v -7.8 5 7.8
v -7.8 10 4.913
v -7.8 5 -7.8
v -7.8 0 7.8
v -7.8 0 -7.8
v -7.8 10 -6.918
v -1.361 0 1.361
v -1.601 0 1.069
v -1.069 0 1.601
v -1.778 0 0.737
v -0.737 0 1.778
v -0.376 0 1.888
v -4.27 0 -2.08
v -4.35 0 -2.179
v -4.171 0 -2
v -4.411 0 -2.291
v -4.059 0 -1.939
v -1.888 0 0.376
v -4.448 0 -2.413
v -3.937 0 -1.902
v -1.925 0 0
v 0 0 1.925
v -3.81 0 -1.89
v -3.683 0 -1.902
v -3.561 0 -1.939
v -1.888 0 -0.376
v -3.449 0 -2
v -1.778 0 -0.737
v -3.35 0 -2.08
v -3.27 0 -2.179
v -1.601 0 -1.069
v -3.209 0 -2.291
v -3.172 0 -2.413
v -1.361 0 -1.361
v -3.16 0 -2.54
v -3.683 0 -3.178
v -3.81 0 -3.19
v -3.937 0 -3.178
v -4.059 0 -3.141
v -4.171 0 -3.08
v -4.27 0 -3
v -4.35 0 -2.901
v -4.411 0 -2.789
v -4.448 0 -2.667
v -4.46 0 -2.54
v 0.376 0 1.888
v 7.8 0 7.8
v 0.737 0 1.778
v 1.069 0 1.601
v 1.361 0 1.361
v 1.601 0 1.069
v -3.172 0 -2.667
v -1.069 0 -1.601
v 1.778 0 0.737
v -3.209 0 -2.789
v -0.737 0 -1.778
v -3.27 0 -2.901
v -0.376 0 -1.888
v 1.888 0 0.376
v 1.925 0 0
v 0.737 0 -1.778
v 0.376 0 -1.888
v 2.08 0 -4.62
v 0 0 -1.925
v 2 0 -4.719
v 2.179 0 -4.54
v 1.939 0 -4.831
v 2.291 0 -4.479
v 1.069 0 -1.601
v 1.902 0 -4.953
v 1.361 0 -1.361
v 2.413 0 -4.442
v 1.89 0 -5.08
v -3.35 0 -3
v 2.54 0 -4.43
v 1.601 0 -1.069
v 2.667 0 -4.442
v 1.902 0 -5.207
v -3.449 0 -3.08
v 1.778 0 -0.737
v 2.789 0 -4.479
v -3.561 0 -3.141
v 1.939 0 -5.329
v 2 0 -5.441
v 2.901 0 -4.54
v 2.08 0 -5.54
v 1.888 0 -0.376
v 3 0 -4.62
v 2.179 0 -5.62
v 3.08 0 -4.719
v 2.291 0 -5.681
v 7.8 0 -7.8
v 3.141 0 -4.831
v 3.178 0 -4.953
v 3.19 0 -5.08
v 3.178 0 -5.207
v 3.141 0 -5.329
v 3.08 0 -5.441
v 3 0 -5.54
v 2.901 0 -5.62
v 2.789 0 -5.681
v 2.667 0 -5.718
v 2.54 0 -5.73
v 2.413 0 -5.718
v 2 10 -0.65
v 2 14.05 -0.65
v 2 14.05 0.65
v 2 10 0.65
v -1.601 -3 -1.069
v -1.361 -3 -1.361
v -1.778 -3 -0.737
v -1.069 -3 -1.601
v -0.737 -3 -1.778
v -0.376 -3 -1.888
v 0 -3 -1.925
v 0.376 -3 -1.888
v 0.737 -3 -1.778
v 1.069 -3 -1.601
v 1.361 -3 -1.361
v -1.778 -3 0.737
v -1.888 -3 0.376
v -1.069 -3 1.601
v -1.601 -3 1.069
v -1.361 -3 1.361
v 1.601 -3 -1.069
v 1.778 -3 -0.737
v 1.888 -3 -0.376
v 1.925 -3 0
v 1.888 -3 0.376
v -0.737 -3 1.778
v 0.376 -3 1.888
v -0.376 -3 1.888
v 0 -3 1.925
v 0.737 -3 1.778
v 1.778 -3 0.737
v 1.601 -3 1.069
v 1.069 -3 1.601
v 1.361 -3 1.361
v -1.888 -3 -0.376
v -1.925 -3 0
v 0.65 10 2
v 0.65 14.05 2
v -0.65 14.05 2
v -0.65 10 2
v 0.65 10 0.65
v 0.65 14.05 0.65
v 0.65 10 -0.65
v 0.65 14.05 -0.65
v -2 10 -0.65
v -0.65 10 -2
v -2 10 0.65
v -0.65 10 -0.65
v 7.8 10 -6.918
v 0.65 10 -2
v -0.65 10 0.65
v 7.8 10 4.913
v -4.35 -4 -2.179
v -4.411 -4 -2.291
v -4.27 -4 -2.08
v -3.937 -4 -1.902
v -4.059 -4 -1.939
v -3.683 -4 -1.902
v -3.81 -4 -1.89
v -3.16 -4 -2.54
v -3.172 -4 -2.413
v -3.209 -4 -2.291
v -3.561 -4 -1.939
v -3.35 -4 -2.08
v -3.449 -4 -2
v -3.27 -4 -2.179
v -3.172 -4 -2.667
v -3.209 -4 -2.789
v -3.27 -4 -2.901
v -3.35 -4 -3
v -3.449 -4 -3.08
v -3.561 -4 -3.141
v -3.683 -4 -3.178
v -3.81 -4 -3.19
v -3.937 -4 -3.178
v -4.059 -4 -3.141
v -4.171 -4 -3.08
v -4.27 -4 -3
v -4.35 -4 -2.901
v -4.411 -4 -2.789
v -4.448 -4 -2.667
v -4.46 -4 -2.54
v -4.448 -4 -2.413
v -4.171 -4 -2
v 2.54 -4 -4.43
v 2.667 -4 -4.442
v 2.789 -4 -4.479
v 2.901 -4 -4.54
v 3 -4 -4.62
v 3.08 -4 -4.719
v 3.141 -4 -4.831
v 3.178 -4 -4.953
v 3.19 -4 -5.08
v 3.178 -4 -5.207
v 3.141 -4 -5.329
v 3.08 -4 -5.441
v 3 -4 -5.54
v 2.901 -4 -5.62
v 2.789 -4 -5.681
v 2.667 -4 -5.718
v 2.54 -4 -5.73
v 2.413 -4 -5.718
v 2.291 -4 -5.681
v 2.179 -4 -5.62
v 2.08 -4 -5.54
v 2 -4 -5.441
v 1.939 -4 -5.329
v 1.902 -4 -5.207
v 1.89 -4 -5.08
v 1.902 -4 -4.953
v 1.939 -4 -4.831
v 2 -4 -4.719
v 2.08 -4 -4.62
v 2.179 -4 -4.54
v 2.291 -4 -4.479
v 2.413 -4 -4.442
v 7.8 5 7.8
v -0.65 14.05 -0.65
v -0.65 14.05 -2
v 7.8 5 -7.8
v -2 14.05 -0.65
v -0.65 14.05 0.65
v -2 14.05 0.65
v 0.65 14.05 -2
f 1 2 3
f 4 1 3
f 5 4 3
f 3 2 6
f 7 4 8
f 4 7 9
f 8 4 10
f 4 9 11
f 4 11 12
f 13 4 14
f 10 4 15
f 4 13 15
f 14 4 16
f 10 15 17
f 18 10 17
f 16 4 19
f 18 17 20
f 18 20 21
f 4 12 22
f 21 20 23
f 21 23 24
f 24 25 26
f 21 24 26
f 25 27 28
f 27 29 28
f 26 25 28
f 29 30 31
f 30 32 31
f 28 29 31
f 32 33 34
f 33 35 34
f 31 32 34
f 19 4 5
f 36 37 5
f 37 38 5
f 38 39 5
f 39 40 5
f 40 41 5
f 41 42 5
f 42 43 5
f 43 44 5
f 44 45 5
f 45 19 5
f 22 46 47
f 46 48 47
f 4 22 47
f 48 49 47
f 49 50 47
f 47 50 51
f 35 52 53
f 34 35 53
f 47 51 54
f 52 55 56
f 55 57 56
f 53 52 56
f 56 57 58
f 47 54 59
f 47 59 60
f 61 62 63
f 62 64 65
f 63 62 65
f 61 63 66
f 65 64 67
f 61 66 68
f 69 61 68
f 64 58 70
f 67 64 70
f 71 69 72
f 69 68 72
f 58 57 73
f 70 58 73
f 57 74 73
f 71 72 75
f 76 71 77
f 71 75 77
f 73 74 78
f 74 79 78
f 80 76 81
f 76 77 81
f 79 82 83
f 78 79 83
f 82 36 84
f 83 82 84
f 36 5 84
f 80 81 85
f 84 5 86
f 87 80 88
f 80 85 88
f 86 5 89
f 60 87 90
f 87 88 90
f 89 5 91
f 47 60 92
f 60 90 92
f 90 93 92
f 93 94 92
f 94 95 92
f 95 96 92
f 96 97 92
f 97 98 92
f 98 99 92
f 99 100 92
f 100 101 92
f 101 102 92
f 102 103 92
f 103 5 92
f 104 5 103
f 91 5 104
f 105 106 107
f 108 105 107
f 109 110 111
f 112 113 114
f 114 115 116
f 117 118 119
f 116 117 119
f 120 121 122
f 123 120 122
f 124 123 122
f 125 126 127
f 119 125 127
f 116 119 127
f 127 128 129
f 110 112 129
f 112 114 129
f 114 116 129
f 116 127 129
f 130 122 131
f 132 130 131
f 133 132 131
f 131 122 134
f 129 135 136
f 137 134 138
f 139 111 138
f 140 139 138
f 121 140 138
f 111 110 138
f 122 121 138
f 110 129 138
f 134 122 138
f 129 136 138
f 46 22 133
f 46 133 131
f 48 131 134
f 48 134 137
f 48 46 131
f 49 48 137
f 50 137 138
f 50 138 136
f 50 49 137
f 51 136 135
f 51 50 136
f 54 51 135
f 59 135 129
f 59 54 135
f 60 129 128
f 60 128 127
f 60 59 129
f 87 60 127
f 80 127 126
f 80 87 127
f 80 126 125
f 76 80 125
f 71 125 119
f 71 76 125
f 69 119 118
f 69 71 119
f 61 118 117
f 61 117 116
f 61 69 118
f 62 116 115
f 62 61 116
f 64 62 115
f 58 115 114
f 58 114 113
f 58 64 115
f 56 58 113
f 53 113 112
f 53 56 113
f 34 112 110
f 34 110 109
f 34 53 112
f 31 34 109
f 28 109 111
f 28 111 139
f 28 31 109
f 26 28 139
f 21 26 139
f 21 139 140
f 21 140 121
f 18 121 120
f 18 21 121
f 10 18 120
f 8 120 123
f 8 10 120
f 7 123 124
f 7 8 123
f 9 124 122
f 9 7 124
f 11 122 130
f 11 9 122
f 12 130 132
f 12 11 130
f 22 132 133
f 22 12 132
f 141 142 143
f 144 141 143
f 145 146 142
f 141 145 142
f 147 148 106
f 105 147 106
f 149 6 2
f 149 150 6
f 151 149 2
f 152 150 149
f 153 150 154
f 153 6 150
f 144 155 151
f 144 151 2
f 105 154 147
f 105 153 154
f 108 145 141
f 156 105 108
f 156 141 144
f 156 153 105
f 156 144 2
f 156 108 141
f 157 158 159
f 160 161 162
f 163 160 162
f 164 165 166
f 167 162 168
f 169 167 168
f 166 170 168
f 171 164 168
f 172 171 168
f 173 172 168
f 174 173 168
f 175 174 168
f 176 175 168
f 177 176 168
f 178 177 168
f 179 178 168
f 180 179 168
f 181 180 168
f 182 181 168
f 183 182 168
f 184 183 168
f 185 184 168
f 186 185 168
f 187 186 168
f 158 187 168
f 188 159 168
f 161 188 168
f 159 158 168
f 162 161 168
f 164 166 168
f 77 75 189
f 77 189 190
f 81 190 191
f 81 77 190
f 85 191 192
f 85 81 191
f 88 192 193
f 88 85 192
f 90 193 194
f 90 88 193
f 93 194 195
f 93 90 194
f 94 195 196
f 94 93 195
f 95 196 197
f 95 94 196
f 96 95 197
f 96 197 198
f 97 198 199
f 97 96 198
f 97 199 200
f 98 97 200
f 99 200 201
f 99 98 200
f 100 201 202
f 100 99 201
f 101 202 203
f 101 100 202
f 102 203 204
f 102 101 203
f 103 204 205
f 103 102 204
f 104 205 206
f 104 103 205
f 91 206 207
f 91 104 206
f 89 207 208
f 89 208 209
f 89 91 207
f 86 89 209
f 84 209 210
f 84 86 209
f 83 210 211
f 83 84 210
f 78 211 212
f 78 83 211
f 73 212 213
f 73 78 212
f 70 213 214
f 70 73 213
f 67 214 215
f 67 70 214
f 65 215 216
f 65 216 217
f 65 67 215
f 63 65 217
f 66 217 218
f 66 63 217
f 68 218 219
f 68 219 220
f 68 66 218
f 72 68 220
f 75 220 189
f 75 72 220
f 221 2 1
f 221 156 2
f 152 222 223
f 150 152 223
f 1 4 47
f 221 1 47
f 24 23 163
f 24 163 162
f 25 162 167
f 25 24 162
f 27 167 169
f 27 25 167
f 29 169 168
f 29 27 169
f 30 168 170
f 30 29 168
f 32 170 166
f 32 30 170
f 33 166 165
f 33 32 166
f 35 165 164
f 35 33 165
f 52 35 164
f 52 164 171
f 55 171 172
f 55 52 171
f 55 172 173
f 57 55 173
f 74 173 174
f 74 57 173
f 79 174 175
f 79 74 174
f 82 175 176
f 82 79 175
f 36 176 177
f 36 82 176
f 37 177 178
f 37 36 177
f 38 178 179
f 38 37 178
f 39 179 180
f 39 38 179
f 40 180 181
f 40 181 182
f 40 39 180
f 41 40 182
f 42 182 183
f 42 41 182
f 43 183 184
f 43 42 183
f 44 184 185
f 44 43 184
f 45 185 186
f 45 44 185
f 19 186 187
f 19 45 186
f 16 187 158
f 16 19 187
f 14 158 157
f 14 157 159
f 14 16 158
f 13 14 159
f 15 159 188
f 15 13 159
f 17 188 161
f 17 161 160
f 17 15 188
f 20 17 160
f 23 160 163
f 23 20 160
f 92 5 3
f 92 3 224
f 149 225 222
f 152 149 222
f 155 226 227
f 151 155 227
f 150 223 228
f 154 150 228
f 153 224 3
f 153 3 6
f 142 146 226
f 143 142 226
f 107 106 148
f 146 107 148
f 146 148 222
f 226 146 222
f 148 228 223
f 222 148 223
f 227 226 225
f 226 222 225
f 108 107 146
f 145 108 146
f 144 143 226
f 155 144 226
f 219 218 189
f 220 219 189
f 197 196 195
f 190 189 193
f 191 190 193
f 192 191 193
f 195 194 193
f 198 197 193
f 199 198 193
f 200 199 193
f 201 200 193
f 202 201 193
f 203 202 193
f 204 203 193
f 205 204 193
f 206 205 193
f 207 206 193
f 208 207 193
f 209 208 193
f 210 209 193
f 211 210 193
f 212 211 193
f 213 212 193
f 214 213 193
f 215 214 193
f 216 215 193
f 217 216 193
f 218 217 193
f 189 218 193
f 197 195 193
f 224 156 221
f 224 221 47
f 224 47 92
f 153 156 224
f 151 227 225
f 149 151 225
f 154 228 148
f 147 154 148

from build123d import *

# Parameters (mm, degrees)
SKETCH1_W           = 15.6
SKETCH1_H           = 15.6
BOSS_EXTRUDE1_DEPTH = 5
BOSS_EXTRUDE2_DEPTH = 7.8
BOSS_EXTRUDE3_DEPTH = 4.05
SKETCH4_R           = 1.925
BOSS_EXTRUDE4_DEPTH = 3
SKETCH6_R           = 0.65
BOSS_EXTRUDE5_DEPTH = 4


with BuildPart() as part:
    # Sketch1 → Boss-Extrude1 (new body)
    with BuildSketch(Plane(origin=(0, 0, 0), x_dir=(1, 0, 0), z_dir=(0, 1, 0))):
        Rectangle(SKETCH1_W, SKETCH1_H)
    extrude(amount=BOSS_EXTRUDE1_DEPTH)

    # Sketch2 → Boss-Extrude2 (add, symmetric)
    with BuildSketch(Plane(origin=(0, 0, 0), x_dir=(0, 0, -1), z_dir=(1, 0, 0))):
        Polygon((-7.8, 5), (7.8, 5), (6.918365096, 10), (-4.913248654, 10), align=None)
    extrude(amount=BOSS_EXTRUDE2_DEPTH, both=True)

    # Sketch3 → Boss-Extrude3 (add)
    with BuildSketch(Plane(origin=(0, 10, 0), x_dir=(1, 0, 0), z_dir=(0, 1, 0))):
        Polygon((-0.65, 2), (0.65, 2), (0.65, 0.65), (2, 0.65), (2, -0.65), (0.65, -0.65), (0.65, -2), (-0.65, -2), (-0.65, -0.65), (-2, -0.65), (-2, 0.65), (-0.65, 0.65), align=None)
    extrude(amount=BOSS_EXTRUDE3_DEPTH)

    # Sketch4 → Boss-Extrude4 (add)
    with BuildSketch(Plane(origin=(0, 0, 0), x_dir=(1, 0, 0), z_dir=(0, 1, 0))):
        with Locations(Location((0, 0, 0), (0, 0, 270))):
            Circle(SKETCH4_R)
    extrude(amount=-BOSS_EXTRUDE4_DEPTH)

    # Sketch6 → Boss-Extrude5 (add)
    with BuildSketch(Plane(origin=(0, 0, 0), x_dir=(1, 0, 0), z_dir=(0, 1, 0))):
        with Locations(Location((2.54, 5.08, 0), (0, 0, 270))):
            Circle(SKETCH6_R)
        with Locations(Location((-3.81, 2.54, 0), (0, 0, 270))):
            Circle(SKETCH6_R)
    extrude(amount=-BOSS_EXTRUDE5_DEPTH)


solid = part.part
